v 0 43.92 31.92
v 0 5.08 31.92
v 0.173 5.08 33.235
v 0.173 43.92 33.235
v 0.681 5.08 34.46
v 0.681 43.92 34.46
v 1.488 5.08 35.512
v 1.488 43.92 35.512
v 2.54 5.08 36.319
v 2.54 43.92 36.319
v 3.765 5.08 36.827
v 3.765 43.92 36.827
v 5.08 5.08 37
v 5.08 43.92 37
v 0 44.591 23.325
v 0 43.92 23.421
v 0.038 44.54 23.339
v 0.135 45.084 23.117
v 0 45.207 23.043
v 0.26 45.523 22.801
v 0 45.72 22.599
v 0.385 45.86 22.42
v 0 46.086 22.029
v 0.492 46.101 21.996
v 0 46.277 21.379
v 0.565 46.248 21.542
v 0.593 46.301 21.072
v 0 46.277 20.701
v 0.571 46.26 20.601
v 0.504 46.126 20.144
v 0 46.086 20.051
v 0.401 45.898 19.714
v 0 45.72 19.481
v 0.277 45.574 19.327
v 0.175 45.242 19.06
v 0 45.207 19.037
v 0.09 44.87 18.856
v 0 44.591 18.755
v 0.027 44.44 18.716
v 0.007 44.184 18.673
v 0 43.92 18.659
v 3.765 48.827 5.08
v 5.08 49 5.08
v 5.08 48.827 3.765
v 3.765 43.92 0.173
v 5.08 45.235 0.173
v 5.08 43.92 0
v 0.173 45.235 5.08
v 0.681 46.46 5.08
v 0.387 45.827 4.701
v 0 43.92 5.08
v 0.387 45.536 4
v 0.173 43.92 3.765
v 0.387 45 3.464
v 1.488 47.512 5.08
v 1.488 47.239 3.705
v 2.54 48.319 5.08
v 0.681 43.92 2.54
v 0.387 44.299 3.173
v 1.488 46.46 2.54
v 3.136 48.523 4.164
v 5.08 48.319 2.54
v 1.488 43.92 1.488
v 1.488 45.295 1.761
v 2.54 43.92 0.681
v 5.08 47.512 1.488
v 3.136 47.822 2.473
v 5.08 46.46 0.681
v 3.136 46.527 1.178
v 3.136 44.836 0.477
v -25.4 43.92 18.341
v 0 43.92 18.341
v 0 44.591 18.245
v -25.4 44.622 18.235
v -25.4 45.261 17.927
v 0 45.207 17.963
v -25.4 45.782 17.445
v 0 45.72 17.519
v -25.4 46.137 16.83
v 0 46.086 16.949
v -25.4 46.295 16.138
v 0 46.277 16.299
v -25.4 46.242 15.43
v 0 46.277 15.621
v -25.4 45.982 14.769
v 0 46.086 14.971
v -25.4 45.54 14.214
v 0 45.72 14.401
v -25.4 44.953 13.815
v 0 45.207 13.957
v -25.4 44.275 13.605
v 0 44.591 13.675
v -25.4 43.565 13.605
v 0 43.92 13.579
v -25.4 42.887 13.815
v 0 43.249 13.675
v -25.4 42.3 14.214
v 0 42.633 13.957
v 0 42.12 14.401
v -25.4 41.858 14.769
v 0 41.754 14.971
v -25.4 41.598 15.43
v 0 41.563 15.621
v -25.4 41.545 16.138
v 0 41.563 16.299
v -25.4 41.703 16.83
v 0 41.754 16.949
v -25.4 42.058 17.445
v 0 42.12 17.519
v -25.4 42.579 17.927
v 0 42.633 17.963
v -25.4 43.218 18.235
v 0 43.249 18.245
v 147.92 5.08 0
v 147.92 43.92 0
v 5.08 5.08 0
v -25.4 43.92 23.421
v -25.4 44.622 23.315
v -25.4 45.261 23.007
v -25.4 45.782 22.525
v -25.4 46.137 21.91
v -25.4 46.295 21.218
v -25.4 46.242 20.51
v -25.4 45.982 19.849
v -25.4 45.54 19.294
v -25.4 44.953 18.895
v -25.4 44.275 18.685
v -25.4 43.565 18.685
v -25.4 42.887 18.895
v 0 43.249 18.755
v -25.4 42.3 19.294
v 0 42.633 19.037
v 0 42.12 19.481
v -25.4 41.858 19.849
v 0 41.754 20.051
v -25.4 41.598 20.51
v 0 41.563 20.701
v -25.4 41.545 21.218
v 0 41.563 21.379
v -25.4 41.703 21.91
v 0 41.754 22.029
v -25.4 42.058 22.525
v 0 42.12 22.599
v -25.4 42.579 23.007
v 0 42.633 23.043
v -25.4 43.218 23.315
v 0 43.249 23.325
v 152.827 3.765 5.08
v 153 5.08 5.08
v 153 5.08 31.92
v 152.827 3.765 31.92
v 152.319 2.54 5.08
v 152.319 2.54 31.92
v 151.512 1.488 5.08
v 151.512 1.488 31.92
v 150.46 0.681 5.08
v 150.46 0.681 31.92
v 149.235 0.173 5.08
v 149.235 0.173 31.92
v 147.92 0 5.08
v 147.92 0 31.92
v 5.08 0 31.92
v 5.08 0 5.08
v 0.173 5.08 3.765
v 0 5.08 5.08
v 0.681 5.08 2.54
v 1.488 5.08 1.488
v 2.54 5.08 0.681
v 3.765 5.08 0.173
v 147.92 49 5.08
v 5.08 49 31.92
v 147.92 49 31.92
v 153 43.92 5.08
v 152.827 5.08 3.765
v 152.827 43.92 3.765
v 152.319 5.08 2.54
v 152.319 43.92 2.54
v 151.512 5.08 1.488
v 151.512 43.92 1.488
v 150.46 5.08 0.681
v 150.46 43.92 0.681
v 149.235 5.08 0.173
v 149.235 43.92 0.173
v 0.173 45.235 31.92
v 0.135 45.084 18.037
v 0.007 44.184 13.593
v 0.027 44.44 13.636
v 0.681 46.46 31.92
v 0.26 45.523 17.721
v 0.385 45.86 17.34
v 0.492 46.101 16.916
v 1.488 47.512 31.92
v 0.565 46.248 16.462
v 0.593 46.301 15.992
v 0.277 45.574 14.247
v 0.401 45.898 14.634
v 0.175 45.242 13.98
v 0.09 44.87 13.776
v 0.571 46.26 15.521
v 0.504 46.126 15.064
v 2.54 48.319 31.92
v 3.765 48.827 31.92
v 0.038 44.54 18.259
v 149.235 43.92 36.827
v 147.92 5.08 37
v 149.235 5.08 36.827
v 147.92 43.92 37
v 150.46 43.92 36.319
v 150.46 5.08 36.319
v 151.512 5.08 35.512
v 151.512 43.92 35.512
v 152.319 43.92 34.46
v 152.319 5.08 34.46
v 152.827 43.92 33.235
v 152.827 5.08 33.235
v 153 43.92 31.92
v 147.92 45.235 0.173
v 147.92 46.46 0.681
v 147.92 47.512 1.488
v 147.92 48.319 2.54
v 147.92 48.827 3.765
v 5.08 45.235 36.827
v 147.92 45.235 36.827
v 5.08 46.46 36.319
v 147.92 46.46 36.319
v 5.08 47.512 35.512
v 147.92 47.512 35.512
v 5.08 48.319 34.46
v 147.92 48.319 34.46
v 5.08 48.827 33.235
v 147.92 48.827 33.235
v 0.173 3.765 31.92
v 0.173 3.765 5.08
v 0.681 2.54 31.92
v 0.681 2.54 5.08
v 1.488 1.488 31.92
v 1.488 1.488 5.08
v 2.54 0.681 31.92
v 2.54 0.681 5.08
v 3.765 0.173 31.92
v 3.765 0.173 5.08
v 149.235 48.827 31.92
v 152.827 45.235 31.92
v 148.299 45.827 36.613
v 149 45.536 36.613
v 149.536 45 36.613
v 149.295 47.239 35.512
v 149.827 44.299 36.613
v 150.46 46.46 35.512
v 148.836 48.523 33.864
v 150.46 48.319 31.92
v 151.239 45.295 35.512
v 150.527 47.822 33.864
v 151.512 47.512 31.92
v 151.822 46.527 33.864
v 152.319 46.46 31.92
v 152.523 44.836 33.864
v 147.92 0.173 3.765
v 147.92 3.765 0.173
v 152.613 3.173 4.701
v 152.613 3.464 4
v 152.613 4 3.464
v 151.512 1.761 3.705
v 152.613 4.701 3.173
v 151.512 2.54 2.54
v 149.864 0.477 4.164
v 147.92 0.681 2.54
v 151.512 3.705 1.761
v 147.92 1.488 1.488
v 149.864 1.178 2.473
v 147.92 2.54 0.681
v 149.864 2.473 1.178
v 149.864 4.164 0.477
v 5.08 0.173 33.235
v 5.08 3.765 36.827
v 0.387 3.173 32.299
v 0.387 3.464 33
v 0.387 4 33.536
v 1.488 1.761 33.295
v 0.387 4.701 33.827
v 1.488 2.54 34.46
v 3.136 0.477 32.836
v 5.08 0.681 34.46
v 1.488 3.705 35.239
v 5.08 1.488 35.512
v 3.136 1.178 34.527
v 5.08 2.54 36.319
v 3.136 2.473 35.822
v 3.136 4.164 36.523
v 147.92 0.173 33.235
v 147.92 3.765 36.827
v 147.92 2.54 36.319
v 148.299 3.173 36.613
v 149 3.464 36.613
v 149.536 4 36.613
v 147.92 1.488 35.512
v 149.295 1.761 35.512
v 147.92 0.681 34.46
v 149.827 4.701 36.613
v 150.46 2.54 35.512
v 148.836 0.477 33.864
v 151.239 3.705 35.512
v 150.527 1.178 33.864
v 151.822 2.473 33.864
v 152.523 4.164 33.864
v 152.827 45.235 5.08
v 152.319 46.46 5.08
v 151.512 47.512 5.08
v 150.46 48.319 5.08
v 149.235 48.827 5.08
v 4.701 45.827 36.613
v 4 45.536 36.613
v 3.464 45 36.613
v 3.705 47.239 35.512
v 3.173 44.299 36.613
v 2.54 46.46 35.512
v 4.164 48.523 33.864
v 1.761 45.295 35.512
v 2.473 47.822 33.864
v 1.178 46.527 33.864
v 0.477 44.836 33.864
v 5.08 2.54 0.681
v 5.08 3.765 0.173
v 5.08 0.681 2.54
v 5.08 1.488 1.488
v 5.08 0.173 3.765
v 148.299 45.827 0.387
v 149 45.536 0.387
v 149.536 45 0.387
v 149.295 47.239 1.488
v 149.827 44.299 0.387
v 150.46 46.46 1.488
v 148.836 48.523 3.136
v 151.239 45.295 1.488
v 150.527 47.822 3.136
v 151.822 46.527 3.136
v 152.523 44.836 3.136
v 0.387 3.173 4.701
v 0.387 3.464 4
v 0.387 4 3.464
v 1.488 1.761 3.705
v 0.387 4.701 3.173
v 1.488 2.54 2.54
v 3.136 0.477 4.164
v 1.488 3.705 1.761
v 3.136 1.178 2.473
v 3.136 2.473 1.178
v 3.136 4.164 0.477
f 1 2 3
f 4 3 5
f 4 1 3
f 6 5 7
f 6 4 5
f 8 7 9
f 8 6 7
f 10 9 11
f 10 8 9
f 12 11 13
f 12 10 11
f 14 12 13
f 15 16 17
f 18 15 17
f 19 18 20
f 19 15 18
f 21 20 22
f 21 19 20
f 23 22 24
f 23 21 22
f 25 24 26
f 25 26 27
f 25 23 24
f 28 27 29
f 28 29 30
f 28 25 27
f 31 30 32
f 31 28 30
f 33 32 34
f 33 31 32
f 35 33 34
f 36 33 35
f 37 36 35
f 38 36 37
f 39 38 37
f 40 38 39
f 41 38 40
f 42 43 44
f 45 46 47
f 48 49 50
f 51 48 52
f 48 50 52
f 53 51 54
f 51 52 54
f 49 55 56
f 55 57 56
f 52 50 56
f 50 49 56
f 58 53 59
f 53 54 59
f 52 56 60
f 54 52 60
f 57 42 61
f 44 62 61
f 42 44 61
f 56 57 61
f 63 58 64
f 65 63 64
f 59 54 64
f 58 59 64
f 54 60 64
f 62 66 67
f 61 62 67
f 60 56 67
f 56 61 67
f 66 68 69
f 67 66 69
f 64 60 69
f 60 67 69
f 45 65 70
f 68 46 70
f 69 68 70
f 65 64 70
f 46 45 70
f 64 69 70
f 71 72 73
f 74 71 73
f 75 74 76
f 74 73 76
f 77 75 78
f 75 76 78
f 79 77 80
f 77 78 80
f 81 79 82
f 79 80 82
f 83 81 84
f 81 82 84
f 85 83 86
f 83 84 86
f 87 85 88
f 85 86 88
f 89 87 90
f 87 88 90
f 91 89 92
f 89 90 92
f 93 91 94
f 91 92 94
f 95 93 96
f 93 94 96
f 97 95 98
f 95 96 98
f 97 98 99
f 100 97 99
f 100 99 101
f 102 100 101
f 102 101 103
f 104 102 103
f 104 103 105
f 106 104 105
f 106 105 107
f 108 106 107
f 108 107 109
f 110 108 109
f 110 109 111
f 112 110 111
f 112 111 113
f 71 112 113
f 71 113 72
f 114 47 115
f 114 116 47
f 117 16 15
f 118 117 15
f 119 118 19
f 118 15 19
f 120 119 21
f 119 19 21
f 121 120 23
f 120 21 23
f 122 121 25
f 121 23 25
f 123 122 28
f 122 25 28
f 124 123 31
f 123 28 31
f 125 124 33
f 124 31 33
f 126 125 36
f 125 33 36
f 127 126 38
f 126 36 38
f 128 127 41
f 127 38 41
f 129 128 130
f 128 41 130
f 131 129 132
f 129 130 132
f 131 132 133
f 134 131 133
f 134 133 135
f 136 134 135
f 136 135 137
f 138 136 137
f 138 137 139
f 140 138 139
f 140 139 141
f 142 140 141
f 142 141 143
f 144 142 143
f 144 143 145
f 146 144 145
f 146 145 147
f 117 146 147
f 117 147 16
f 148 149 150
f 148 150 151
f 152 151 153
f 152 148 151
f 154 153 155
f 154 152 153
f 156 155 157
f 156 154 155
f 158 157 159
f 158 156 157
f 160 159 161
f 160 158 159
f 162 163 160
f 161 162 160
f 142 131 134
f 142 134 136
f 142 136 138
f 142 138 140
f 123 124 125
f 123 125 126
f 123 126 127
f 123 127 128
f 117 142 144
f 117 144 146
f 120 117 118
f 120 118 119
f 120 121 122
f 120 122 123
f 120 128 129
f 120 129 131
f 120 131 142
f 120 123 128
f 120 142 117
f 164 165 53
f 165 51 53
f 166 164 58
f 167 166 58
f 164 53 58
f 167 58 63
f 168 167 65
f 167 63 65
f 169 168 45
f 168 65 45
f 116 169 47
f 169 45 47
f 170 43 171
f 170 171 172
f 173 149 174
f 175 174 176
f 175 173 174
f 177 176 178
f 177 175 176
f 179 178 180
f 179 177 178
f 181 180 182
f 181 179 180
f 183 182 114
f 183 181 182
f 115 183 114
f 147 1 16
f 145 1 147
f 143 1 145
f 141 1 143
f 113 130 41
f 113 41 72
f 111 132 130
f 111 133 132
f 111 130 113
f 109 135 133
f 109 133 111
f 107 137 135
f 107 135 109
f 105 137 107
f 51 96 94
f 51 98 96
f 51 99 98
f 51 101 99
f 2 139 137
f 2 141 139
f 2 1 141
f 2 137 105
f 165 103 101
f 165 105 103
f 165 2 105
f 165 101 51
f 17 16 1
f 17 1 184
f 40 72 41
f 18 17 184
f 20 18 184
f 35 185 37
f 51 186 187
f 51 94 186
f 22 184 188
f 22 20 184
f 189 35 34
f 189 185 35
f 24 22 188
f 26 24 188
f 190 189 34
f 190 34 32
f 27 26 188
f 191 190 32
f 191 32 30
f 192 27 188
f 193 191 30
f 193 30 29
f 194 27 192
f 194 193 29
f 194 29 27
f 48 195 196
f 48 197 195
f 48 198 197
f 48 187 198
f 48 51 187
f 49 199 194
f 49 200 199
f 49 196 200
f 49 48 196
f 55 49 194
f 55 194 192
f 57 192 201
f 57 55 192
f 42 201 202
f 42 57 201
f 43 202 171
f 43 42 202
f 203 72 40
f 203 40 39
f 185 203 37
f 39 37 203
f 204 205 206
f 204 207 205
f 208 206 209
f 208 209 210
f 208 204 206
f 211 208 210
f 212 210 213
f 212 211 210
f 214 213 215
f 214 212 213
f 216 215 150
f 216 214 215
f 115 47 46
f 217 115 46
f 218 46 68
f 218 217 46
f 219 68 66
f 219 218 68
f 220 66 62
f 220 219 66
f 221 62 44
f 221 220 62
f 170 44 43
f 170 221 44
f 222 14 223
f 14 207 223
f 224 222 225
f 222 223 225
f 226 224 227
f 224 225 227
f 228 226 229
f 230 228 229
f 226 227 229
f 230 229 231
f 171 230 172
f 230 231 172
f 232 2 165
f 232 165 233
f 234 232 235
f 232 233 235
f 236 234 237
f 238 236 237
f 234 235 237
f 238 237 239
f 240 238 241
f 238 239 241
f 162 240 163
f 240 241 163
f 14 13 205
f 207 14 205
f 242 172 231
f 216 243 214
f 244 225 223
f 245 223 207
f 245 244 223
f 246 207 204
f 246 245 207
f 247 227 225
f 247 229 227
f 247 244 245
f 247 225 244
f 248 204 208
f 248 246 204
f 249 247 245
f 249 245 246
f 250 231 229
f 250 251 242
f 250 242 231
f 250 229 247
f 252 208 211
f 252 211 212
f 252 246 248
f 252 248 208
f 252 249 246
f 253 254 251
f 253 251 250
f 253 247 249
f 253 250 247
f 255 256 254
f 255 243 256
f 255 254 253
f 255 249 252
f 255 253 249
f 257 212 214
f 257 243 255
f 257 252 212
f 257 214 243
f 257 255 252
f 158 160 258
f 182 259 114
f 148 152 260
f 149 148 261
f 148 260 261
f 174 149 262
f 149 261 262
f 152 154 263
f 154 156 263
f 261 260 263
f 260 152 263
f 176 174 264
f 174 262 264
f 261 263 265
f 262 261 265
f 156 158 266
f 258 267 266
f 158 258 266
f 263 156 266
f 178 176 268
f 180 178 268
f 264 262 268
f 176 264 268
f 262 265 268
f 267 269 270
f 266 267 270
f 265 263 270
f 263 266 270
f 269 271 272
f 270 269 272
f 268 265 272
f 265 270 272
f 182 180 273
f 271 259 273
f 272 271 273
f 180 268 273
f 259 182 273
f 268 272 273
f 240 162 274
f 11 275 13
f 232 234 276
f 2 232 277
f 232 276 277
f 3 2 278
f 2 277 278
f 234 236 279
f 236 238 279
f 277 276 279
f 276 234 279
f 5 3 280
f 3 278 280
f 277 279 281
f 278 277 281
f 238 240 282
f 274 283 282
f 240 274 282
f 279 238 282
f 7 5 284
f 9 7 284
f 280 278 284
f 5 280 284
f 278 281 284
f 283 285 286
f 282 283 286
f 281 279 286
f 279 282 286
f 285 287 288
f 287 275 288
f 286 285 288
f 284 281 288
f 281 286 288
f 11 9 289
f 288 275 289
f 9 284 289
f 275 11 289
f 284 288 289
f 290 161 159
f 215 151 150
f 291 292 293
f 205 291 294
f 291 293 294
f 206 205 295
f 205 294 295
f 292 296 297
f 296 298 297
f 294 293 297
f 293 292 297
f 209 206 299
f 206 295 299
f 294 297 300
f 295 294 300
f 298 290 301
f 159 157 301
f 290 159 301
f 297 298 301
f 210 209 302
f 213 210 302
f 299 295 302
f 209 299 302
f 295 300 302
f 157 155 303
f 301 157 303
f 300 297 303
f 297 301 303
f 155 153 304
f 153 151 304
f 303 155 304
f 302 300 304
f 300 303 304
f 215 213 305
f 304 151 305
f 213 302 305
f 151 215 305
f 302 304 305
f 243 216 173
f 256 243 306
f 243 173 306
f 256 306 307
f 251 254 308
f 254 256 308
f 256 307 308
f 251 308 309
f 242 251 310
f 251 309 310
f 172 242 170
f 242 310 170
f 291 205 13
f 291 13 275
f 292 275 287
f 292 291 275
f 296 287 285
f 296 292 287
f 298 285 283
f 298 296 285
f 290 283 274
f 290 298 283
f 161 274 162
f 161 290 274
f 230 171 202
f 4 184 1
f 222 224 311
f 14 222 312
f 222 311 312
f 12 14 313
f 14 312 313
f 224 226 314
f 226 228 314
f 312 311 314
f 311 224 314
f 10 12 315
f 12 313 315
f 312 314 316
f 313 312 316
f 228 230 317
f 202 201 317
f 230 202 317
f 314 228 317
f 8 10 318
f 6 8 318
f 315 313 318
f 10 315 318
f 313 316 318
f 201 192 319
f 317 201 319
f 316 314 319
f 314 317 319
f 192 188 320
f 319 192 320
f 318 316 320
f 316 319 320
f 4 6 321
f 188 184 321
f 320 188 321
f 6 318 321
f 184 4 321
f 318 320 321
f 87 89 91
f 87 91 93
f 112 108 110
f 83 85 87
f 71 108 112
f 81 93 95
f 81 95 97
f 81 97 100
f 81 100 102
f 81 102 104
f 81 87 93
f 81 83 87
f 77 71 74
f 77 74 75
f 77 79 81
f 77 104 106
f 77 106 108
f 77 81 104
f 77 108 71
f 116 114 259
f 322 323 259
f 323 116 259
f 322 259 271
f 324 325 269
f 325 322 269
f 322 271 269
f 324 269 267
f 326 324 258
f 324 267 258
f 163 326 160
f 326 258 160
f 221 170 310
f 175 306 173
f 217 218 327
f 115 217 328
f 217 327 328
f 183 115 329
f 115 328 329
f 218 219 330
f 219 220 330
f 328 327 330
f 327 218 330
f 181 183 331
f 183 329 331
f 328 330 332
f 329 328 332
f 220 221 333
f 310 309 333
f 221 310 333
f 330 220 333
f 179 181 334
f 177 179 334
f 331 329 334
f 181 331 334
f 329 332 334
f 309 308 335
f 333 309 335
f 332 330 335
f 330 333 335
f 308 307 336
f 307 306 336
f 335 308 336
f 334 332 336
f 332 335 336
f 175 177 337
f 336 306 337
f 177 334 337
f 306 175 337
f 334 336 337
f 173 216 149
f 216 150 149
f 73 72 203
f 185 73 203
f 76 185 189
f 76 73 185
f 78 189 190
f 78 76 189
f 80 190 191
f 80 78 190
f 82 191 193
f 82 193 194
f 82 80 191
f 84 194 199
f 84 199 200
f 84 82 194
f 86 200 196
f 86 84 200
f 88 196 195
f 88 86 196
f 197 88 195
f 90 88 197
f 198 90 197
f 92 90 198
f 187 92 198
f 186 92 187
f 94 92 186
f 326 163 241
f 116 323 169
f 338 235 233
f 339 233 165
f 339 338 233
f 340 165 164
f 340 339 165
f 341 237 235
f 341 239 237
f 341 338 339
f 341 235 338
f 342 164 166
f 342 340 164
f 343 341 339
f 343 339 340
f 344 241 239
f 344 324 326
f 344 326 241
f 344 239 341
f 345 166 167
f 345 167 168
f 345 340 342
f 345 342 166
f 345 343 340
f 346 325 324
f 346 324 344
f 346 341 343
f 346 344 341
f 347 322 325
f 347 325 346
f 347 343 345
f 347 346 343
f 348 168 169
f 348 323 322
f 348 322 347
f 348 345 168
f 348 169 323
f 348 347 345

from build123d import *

# Parameters (mm, degrees)
SKETCH1_W                = 153
SKETCH1_H                = 37
BOSS_EXTRUDE1_DEPTH      = 49
FILLET1_R                = 5.08
SKETCH2_R                = 2.38125
BOSS_EXTRUDE2_DEPTH      = 25.4
BOSS_EXTRUDE2_DEPTH_BACK = 25.4


with BuildPart() as part:
    # Sketch1 → Boss-Extrude1 (new body)
    with BuildSketch(Plane(origin=(0, 0, 0), x_dir=(1, 0, 0), z_dir=(0, 1, 0))):
        with Locations((76.5, -18.5)):
            Rectangle(SKETCH1_W, SKETCH1_H)
    extrude(amount=BOSS_EXTRUDE1_DEPTH)

    # Fillet1
    fillet1_edges = [part.edges().sort_by_distance(p)[0] for p in [
        (153, 49, 18.5),
        (76.5, 49, 0),
        (0, 49, 18.5),
        (76.5, 0, 0),
        (153, 0, 18.5),
        (76.5, 0, 37),
        (0, 0, 18.5),
        (76.5, 49, 37),
        (0, 24.5, 0),
        (153, 24.5, 0),
        (153, 24.5, 37),
        (0, 24.5, 37),
    ]]
    fillet(fillet1_edges, radius=FILLET1_R)

    # Sketch2 → Boss-Extrude2 (add, two sides)
    with BuildSketch(Plane.ZY) as boss_extrude2_sk:
        with Locations((15.96, 43.92)):
            Circle(SKETCH2_R)
        with Locations((21.04, 43.92)):
            Circle(SKETCH2_R)
    extrude(amount=BOSS_EXTRUDE2_DEPTH)
    extrude(boss_extrude2_sk.sketch, amount=-BOSS_EXTRUDE2_DEPTH_BACK)


solid = part.part
